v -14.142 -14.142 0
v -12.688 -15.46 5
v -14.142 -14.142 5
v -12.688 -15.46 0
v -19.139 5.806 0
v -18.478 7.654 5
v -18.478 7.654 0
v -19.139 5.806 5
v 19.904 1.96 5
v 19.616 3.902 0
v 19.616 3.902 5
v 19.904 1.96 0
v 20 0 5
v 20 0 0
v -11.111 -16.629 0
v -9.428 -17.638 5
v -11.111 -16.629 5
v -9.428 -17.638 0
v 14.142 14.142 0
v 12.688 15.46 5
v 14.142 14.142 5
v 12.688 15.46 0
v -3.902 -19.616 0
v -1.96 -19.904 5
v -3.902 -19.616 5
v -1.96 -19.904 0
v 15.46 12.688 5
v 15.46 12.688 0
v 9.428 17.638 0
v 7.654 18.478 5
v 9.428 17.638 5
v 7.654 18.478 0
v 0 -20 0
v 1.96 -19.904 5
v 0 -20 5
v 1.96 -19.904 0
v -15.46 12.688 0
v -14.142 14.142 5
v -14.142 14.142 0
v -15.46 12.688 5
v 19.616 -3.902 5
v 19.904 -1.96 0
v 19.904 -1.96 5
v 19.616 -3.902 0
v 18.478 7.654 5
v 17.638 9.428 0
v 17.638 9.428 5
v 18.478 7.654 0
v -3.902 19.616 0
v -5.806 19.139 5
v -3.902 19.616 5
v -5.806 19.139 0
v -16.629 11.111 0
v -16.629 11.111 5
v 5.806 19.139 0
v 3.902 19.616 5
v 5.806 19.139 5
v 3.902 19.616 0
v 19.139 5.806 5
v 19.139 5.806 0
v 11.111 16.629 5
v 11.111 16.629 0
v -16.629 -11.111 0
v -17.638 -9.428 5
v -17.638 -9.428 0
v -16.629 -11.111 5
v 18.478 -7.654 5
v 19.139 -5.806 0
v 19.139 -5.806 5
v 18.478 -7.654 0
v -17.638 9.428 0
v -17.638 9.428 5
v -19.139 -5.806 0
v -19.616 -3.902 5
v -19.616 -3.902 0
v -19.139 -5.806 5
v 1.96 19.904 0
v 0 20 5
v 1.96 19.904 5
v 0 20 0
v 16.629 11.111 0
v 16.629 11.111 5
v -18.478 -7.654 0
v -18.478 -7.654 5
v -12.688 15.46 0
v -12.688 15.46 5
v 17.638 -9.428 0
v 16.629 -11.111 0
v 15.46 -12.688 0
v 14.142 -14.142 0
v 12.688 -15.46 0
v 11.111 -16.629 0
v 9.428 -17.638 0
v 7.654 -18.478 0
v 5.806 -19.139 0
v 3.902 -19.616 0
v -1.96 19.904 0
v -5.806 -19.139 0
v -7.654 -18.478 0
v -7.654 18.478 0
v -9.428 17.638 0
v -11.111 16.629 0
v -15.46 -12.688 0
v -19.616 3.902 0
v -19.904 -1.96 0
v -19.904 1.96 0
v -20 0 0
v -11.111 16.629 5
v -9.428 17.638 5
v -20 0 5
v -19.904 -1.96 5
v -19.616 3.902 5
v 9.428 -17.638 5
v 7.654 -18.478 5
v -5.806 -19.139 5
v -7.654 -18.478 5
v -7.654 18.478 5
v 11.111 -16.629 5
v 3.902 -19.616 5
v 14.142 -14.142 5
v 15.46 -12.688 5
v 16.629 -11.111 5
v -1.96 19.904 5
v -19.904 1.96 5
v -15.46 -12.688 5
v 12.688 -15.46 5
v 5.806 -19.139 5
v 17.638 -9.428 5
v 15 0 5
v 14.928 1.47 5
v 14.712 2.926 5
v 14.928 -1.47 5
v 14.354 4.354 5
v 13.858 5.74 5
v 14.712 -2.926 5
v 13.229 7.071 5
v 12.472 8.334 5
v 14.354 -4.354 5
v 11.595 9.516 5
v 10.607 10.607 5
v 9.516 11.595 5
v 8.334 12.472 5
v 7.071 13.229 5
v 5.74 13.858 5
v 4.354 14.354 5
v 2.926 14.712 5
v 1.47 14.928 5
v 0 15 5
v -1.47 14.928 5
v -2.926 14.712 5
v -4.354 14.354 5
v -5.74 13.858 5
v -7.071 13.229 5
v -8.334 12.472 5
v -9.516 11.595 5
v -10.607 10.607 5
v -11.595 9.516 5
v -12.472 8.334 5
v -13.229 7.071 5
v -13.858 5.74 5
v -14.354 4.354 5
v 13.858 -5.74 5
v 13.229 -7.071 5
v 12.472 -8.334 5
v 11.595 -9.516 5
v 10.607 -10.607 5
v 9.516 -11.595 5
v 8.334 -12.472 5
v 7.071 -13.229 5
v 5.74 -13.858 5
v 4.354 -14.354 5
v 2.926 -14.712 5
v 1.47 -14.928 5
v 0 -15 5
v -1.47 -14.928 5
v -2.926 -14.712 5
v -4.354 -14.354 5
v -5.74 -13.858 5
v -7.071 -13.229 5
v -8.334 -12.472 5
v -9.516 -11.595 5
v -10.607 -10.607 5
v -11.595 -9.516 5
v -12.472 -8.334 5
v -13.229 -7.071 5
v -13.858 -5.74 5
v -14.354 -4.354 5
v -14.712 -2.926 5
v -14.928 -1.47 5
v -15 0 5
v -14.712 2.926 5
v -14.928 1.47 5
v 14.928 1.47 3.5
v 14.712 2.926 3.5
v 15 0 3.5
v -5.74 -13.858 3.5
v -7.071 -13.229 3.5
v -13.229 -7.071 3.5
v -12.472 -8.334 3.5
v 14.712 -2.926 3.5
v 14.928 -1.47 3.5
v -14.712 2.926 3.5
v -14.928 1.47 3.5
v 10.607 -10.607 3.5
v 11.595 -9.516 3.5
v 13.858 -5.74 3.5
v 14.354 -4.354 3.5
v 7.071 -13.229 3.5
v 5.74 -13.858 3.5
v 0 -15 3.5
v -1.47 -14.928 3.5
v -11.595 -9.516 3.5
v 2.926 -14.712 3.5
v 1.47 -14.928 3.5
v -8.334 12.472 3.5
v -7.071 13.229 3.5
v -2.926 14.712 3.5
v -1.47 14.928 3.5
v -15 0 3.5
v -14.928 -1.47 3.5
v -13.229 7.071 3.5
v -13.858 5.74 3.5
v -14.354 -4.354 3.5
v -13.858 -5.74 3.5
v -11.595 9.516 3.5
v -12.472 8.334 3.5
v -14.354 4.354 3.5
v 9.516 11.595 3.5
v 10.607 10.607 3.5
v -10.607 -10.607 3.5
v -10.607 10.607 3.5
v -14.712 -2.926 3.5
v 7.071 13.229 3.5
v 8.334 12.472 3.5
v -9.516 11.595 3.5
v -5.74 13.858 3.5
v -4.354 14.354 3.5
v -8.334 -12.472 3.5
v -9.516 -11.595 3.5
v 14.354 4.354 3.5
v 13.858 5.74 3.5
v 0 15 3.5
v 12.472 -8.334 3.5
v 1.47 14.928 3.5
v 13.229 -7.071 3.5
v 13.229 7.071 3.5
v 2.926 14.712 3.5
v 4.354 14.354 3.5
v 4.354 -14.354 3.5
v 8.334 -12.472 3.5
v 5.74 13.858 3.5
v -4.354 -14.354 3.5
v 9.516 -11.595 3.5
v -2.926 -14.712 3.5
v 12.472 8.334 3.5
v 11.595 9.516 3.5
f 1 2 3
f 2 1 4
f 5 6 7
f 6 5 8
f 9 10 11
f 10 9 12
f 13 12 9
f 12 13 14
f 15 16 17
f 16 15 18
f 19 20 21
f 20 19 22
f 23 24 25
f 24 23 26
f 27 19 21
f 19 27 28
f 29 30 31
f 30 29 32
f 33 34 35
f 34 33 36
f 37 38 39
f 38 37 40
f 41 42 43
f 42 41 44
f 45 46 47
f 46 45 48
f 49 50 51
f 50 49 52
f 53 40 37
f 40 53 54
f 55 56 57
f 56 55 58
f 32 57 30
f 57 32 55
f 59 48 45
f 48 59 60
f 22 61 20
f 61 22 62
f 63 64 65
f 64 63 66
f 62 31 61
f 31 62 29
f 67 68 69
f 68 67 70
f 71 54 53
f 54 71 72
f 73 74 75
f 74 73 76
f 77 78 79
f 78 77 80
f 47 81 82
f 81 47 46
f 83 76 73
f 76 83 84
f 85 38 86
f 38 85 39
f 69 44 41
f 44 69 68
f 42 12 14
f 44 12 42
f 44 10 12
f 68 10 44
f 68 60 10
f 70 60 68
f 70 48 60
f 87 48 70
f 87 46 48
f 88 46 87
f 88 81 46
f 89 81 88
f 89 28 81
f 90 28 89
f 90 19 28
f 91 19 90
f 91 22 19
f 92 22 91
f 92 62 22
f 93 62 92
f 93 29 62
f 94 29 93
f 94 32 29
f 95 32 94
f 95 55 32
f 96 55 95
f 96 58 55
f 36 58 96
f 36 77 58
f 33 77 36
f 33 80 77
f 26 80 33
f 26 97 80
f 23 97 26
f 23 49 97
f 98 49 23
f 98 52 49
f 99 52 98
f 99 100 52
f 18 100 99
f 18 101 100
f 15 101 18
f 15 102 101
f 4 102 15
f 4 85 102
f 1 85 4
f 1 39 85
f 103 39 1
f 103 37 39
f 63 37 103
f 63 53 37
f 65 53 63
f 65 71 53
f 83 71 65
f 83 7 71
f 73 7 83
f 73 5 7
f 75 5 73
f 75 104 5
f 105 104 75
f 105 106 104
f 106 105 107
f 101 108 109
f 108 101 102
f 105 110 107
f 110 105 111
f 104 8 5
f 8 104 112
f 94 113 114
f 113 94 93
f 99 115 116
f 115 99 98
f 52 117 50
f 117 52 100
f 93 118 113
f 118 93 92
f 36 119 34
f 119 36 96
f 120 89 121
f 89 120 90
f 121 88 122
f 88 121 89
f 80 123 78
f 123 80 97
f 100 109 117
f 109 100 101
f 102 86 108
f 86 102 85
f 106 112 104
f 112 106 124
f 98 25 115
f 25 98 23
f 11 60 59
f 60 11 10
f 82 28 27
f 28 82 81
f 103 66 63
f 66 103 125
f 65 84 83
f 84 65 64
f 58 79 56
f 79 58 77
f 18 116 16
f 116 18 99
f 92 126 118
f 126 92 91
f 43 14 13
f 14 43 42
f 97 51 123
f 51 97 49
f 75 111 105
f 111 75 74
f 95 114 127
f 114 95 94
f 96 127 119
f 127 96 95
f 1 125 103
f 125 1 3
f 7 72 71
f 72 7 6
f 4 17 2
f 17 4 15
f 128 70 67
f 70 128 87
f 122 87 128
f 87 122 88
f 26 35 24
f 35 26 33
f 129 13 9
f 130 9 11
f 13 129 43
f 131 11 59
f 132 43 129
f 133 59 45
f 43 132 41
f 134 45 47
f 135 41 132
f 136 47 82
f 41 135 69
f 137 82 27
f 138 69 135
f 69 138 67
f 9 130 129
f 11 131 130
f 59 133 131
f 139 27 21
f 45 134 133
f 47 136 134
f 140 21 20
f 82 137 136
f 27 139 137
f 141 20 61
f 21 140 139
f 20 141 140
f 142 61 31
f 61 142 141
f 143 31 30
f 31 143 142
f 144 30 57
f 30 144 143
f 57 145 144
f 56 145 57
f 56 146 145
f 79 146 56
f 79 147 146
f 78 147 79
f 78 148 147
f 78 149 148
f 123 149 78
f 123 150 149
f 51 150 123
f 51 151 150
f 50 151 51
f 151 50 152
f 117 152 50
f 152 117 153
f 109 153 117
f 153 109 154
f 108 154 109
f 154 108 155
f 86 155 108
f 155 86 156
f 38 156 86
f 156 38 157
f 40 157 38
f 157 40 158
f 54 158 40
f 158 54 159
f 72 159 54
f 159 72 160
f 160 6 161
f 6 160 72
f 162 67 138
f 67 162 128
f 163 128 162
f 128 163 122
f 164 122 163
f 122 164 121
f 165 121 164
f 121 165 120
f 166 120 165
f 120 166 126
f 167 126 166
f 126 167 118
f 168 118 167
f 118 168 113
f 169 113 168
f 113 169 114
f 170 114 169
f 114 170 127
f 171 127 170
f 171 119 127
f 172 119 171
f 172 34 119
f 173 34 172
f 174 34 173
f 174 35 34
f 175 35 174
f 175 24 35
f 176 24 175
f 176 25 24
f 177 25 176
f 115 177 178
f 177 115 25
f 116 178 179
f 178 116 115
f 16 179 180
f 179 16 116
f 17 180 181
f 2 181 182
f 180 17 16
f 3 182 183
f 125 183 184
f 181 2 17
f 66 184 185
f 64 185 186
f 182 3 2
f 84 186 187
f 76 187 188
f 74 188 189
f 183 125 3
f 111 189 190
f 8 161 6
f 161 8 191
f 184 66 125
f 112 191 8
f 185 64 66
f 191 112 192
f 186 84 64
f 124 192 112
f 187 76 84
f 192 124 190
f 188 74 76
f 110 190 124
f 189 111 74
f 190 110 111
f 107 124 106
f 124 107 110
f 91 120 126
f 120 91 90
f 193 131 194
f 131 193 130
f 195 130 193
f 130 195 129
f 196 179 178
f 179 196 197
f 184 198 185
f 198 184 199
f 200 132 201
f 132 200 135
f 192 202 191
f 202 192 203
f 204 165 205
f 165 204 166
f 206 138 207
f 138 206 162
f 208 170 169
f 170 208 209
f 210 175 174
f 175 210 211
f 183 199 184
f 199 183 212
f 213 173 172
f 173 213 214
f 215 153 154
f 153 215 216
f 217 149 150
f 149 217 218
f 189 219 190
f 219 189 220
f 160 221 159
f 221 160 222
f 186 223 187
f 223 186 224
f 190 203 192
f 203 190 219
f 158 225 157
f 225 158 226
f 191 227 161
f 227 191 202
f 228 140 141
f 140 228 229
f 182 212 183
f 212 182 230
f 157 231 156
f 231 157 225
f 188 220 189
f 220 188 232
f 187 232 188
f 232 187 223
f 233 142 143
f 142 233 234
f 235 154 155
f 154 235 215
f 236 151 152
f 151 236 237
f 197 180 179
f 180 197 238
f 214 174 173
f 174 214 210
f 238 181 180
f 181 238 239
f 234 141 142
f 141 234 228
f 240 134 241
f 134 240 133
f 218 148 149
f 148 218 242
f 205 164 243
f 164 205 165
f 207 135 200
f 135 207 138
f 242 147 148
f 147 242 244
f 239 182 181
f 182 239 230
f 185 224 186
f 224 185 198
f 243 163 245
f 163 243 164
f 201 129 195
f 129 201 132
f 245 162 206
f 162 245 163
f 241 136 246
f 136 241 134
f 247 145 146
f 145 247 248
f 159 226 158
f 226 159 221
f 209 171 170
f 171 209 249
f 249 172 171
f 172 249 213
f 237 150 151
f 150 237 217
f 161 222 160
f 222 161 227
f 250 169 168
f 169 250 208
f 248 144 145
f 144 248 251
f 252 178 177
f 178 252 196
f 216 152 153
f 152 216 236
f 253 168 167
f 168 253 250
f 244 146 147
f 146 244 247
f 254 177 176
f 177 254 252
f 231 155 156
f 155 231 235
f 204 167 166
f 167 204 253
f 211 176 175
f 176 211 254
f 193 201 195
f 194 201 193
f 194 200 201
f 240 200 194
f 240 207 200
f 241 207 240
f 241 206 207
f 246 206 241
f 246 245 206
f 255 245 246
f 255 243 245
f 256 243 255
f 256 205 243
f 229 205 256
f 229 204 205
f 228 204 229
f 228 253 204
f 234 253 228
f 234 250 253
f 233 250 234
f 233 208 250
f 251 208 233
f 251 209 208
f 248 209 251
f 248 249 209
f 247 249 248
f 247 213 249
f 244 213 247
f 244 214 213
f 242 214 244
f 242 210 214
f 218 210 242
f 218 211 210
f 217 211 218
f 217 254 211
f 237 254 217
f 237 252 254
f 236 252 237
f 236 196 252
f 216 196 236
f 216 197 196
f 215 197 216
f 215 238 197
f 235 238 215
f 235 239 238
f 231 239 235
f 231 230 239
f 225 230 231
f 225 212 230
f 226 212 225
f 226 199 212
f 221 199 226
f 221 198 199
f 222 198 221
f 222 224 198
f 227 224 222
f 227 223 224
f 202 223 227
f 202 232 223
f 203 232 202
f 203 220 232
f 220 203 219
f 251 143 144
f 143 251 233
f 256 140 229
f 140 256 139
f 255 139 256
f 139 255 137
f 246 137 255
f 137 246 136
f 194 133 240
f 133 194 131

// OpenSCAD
/* [Badge] */

// Overall diameter in mm
diameter = 40; // [20:100]

// Badge thickness in mm
thickness = 5; // [2:0.5:12]

// Rim width around the inset
border_width = 3; // [1:0.5:8]

/* [Inset] */

// How deep the inset sits below the rim
inset_depth = 1.5; // [0.5:0.1:4]

// Shape of the color inset
inset_shape = "circle"; // [circle:Circle,star:Star,hex:Hexagon]

/* [Colors] */

// Base plate color (hex — also used for the .3mf/preview color, not just geometry preview)
base_color = "#2b2b2b";

// Inset color
inset_color = "#c9a227";

/* [Hidden] */

$fn = 64;

function inset_radius() = (diameter - border_width * 2 - 4) / 2;

module inset_2d() {
    r = inset_radius();
    if (inset_shape == "circle") {
        circle(r = r);
    } else if (inset_shape == "hex") {
        polygon(points = [for (a = [0:60:300]) [r * cos(a), r * sin(a)]]);
    } else {
        r_in = r * 0.45;
        polygon(points = [for (i = [0:9]) let (a = 90 + i * 36, rr = (i % 2 == 0) ? r : r_in) [rr * cos(a), rr * sin(a)]]);
    }
}

// The outer plate, with a pocket cut for the inset to sit in. This is the
// module rendered in the "base" color pass — see worker.js.
module badge_base() {
    difference() {
        cylinder(d = diameter, h = thickness);
        translate([0, 0, thickness - inset_depth])
            linear_extrude(inset_depth + 0.1)
                inset_2d();
    }
}

// The plug that fills the pocket, in the "inset" color pass.
module badge_inset() {
    translate([0, 0, thickness - inset_depth])
        linear_extrude(inset_depth)
            inset_2d();
}

badge_base();
